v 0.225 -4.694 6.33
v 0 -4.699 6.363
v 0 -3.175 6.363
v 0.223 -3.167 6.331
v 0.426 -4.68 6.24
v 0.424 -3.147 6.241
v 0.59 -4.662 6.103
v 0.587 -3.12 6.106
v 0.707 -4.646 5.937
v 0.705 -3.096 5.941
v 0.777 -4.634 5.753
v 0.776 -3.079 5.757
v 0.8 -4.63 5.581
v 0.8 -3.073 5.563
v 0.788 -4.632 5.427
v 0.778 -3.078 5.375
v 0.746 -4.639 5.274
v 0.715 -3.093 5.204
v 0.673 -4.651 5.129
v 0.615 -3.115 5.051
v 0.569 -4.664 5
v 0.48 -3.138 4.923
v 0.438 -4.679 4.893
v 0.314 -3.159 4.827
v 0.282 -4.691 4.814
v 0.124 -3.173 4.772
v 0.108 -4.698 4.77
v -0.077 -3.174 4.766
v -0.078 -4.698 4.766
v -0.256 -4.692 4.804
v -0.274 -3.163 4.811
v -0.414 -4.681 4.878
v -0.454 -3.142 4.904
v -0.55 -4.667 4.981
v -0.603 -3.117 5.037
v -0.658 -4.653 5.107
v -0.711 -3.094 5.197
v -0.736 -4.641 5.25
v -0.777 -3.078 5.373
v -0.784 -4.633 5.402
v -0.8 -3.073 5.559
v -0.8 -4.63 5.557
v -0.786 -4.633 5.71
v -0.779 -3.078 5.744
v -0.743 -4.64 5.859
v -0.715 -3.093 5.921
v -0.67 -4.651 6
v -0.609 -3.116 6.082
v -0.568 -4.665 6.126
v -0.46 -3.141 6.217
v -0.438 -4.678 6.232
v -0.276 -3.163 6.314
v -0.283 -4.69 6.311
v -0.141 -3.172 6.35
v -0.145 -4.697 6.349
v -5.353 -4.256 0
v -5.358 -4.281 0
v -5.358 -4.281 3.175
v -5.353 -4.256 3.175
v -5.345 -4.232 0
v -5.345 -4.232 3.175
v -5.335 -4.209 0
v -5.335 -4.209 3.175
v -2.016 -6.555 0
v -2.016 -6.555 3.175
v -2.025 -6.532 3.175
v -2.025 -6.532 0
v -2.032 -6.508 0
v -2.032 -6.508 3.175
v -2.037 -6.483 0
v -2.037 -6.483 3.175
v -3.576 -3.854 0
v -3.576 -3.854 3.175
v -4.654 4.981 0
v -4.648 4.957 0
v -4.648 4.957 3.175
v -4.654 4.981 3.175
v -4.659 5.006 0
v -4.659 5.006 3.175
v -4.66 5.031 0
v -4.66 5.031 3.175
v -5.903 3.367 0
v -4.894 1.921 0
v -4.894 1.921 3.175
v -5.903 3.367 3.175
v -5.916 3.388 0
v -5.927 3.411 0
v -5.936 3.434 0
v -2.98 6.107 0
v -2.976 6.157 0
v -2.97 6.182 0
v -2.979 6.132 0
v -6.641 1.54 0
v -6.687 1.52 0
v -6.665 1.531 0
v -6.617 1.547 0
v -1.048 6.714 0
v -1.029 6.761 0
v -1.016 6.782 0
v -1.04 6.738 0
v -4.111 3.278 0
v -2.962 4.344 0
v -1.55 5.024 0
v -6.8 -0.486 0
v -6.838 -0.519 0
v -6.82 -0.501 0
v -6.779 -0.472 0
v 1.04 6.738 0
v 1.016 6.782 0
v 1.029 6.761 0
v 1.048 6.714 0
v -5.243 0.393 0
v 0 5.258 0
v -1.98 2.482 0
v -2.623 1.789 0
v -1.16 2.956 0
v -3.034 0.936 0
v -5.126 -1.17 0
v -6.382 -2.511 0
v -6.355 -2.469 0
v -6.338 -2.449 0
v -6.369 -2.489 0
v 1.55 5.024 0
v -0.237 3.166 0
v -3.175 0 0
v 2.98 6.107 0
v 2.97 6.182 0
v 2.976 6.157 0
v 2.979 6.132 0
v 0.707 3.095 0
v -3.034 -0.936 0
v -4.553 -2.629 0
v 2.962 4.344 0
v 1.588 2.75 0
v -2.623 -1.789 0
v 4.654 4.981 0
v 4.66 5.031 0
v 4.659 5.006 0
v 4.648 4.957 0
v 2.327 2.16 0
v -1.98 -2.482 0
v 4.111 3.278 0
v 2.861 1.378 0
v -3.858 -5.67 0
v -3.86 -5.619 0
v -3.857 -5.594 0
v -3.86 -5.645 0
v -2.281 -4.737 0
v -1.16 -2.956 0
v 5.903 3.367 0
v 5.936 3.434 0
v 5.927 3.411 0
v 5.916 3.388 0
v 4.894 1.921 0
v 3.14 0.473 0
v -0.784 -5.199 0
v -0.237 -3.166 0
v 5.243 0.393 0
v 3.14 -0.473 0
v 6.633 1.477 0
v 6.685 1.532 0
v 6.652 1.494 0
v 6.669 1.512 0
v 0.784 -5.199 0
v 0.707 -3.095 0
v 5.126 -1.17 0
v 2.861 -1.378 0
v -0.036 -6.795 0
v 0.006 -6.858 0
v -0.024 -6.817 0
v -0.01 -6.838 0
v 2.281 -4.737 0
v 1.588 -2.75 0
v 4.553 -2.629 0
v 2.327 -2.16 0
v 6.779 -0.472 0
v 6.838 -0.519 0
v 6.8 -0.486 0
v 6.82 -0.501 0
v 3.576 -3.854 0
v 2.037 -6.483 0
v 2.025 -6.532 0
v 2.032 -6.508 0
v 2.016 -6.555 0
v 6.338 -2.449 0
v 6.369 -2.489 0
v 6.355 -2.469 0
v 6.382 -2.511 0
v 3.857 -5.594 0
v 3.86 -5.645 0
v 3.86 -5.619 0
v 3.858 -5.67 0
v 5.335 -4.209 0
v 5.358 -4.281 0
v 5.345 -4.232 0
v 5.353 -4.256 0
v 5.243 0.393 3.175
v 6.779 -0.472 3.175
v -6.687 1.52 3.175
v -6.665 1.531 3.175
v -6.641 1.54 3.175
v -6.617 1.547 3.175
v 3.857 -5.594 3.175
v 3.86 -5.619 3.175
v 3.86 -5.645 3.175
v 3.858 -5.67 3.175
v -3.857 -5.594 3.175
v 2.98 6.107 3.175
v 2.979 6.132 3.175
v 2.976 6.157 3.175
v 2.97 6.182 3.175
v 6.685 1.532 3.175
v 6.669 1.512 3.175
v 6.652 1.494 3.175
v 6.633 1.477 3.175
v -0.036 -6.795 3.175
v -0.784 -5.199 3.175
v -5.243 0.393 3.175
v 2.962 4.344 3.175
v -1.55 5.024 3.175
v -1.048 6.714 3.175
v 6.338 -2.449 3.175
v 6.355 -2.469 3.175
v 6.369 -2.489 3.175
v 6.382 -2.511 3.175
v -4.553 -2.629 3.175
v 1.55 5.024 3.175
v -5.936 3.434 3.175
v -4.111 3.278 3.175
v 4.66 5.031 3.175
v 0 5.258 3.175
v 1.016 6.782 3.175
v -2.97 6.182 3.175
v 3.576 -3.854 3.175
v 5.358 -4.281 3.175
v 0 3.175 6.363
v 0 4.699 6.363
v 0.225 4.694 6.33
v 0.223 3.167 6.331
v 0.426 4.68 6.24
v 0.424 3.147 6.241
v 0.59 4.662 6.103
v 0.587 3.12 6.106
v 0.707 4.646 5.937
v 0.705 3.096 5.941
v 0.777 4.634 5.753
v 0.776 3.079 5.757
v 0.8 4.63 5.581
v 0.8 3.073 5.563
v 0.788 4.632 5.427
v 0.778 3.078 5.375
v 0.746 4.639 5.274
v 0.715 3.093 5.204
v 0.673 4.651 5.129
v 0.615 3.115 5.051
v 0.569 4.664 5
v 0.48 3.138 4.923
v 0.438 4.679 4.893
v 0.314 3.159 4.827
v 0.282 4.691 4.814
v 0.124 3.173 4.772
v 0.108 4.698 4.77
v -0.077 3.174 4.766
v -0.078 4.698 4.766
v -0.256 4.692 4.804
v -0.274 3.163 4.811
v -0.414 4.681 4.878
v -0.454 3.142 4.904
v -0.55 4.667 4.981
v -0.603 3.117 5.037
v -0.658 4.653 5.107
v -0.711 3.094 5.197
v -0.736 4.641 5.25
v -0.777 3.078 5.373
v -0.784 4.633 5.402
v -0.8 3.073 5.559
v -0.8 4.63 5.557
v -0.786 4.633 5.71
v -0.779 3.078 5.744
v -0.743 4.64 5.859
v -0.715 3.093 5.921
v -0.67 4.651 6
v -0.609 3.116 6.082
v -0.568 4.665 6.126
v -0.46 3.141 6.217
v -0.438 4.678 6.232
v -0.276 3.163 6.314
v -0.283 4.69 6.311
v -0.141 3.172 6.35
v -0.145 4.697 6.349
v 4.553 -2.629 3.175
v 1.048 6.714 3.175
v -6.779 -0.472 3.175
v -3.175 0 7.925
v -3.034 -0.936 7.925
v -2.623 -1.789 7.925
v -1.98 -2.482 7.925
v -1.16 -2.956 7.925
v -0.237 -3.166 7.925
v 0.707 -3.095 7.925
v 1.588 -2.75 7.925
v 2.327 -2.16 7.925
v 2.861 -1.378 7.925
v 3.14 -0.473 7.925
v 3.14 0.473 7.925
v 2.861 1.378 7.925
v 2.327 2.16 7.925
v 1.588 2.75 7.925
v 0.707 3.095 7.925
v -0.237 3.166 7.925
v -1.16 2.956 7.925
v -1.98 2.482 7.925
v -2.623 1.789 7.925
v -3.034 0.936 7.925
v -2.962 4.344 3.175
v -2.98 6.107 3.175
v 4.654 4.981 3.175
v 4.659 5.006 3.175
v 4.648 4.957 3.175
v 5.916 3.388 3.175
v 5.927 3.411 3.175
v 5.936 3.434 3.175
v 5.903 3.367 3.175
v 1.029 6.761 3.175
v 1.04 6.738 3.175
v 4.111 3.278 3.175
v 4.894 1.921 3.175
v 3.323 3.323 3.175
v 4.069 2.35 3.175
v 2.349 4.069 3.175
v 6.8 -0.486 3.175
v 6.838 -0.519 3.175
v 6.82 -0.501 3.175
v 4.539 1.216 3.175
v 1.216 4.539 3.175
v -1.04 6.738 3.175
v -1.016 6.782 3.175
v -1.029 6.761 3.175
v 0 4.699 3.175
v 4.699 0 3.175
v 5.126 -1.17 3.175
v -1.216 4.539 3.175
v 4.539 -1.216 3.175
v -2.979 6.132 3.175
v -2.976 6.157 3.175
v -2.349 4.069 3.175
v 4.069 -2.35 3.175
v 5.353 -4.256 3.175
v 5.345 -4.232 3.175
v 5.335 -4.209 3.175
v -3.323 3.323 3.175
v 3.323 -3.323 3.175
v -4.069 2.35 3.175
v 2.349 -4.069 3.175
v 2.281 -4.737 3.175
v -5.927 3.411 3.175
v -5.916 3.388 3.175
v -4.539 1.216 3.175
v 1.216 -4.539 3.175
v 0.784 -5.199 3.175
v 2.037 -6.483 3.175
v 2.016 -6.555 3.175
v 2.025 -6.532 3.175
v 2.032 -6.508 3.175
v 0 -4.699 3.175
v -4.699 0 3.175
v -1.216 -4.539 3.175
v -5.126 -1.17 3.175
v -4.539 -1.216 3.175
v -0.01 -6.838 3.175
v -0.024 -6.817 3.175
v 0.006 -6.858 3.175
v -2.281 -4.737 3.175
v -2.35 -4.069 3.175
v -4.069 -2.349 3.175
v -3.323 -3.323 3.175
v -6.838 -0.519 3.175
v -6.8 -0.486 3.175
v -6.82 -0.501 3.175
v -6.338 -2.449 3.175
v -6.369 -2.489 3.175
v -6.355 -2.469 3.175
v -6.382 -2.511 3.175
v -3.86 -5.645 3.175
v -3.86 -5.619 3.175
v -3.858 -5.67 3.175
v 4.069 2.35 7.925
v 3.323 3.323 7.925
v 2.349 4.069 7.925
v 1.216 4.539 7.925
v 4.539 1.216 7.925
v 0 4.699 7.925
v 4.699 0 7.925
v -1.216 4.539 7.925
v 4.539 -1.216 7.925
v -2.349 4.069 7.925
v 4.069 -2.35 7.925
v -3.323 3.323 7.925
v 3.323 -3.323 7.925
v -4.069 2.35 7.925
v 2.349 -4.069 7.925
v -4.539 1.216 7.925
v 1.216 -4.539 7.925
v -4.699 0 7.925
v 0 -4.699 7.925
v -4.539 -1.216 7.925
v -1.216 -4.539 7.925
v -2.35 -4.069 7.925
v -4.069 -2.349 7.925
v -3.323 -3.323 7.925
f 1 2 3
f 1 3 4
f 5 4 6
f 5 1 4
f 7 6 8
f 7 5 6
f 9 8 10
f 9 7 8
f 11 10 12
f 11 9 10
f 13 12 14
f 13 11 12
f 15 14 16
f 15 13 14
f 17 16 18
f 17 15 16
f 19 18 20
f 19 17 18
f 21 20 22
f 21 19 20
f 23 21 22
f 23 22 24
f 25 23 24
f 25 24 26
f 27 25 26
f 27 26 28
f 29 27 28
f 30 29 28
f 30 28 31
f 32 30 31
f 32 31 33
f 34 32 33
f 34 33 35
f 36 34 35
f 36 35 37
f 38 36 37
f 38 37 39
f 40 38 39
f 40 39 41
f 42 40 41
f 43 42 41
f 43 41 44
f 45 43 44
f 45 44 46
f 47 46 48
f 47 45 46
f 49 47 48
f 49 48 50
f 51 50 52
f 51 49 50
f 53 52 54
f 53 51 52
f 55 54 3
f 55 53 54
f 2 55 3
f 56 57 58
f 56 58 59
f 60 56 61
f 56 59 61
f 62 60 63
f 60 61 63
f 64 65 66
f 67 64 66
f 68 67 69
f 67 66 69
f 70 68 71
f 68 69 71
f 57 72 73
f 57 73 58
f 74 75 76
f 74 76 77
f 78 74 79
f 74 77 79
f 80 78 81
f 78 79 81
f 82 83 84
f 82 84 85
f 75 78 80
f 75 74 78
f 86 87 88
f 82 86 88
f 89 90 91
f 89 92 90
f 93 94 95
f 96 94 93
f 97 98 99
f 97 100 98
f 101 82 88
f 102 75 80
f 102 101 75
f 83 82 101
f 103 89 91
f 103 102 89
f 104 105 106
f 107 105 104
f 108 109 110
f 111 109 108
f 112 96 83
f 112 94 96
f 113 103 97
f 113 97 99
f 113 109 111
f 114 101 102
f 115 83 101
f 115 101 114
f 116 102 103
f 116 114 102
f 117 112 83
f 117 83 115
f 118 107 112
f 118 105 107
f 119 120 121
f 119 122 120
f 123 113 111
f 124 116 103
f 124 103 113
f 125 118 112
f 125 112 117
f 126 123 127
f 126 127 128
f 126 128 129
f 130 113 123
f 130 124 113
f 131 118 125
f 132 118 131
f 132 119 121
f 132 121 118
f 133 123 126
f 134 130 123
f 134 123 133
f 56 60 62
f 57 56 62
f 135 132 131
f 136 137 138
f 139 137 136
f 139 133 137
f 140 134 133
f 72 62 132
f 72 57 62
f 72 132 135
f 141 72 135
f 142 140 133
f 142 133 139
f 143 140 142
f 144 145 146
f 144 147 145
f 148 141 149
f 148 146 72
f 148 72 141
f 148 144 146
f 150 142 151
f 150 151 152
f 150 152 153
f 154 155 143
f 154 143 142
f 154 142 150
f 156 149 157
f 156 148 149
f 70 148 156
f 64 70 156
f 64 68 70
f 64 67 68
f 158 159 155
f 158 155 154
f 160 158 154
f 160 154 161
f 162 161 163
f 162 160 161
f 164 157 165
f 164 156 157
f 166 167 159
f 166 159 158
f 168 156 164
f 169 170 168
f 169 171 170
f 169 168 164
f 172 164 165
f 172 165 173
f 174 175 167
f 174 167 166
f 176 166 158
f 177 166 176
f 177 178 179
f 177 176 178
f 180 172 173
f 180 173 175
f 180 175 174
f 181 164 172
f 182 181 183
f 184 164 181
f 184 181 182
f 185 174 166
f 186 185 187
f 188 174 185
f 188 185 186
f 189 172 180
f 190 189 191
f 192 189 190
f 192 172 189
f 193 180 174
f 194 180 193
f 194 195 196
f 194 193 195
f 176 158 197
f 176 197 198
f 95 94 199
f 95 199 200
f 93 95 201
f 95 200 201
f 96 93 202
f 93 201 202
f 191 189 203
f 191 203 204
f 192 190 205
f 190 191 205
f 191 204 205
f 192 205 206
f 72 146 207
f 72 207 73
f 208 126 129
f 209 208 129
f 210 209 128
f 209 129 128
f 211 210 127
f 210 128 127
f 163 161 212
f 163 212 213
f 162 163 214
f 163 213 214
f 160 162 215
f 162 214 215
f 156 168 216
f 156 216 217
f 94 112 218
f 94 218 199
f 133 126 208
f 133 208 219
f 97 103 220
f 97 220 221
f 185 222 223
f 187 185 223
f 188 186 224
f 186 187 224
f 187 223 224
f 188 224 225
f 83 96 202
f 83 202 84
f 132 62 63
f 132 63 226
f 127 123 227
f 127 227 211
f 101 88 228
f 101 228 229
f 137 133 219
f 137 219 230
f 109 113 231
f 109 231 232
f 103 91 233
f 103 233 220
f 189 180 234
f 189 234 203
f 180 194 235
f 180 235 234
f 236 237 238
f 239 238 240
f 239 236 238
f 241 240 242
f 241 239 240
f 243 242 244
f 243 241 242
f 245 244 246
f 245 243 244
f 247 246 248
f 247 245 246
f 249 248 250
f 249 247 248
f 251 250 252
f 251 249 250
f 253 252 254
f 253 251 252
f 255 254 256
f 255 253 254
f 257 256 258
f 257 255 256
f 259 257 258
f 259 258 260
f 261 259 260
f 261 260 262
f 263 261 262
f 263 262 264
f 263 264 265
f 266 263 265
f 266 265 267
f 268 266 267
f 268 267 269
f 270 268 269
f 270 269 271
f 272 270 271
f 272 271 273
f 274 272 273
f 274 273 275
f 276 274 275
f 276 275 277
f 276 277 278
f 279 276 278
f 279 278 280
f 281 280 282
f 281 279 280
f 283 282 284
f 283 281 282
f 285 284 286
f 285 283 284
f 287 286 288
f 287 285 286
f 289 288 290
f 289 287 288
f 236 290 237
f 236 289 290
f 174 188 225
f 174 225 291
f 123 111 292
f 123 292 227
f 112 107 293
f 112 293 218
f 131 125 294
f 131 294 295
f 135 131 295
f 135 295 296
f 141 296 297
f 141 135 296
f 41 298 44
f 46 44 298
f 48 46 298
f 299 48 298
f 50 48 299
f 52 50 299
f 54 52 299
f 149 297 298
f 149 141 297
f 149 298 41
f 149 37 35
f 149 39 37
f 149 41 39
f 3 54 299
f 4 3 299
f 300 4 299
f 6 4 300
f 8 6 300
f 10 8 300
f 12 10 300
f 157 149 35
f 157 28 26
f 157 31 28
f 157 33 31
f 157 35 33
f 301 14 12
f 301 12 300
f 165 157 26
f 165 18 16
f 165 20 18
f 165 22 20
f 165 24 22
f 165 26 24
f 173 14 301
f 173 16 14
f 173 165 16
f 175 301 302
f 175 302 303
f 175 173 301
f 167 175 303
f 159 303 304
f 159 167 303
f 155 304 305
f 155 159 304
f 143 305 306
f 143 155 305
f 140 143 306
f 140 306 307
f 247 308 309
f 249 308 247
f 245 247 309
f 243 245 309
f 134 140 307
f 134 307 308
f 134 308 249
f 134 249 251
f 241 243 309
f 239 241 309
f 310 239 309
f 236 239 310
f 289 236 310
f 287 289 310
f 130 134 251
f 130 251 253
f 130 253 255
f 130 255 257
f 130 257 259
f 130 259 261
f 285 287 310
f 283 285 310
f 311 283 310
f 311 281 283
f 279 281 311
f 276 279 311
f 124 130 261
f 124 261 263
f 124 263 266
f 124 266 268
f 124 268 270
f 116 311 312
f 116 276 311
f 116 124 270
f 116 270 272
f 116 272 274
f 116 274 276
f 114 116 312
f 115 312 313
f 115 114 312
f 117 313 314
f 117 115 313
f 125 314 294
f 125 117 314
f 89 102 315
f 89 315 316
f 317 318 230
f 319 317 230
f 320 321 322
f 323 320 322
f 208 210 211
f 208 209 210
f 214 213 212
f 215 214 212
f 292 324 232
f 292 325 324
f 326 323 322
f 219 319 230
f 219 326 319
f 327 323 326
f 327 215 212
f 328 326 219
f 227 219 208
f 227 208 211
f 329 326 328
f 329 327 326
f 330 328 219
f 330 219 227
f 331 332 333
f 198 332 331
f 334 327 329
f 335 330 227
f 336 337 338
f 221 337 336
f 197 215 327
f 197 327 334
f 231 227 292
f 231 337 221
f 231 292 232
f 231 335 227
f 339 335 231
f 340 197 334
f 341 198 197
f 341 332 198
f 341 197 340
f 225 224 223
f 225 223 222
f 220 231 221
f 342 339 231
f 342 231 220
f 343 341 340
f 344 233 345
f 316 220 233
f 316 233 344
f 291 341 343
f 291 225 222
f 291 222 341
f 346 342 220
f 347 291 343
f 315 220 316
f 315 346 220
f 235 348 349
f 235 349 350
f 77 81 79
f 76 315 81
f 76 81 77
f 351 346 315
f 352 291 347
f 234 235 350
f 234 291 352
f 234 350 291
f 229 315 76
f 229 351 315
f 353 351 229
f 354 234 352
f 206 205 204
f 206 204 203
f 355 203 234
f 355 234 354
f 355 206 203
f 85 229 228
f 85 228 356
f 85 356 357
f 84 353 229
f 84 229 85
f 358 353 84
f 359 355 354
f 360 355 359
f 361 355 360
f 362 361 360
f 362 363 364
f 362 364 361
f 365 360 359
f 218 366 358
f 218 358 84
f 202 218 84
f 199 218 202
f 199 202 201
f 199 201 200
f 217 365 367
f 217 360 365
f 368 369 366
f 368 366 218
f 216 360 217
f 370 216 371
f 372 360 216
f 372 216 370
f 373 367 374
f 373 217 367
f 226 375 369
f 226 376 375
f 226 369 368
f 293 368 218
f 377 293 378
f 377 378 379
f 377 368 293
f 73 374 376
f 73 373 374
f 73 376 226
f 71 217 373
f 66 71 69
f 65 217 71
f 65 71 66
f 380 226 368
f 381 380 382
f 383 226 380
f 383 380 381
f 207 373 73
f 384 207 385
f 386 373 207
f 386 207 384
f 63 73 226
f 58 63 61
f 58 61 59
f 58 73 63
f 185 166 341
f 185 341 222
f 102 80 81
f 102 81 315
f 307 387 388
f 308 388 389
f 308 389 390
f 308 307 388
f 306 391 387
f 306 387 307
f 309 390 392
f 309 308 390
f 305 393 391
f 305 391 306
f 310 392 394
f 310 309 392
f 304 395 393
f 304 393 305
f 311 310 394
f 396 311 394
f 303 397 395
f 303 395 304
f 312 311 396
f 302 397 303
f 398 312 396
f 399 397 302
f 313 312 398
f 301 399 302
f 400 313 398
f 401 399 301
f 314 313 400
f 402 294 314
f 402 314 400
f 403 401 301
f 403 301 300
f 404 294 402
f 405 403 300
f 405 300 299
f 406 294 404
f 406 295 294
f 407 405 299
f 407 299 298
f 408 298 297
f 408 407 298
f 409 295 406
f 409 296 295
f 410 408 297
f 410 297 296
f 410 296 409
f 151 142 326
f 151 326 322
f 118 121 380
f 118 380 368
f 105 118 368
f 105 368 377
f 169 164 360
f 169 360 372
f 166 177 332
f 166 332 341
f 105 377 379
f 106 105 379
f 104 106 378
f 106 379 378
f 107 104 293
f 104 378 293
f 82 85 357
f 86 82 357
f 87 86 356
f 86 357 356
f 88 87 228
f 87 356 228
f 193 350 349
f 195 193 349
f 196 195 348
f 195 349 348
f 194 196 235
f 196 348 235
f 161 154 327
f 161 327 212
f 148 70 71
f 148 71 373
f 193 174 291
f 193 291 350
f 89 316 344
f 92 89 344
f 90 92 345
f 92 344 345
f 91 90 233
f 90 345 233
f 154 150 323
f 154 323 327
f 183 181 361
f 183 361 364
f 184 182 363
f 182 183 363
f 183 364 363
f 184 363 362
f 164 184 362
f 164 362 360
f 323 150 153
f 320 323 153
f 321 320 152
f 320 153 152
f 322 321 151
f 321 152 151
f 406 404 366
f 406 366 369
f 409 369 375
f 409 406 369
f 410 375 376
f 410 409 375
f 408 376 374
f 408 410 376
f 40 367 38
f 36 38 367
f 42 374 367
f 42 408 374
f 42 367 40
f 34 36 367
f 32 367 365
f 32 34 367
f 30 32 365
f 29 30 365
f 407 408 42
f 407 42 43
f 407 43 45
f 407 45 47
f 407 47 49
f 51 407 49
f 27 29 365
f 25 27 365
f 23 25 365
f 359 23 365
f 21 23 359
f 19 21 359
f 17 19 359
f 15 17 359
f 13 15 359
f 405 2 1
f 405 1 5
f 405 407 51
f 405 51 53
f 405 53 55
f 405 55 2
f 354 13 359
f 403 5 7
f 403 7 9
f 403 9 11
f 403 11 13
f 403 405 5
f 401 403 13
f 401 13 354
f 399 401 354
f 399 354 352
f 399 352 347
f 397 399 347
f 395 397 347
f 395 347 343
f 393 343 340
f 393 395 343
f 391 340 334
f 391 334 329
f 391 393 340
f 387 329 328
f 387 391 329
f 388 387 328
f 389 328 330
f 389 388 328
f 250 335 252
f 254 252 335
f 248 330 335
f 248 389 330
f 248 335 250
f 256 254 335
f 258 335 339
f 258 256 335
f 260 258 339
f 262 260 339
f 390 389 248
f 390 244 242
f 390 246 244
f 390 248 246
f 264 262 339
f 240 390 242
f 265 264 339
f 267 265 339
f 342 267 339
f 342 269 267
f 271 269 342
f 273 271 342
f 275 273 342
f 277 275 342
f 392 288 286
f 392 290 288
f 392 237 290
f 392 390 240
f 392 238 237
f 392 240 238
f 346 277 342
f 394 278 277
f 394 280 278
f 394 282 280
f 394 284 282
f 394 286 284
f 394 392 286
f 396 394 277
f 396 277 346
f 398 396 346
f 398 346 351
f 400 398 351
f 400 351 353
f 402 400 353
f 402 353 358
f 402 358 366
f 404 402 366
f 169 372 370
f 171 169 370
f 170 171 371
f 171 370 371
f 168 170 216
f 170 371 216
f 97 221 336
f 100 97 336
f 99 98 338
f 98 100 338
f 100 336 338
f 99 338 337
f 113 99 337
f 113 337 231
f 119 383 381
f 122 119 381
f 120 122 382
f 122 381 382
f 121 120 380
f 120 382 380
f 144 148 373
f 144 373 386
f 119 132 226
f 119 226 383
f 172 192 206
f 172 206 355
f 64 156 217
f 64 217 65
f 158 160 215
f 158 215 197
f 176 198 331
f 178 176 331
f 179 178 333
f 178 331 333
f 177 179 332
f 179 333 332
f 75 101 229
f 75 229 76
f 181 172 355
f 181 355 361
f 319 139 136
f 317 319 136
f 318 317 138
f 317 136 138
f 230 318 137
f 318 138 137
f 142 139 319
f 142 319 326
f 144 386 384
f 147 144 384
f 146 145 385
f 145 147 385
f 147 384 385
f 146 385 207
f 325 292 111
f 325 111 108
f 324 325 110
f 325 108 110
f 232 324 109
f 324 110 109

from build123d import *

# Parameters (mm, degrees)
CUT_EXTRUDE5_DEPTH      = 11.799302202
CUT_EXTRUDE5_DEPTH_BACK = 11.799302202
FILLET1_R               = 0.254
CUT_EXTRUDE4_DEPTH      = 13.513900808
CUT_EXTRUDE4_DEPTH_BACK = 13.513900808
SKETCH4_R               = 0.8001


with BuildPart() as part:
    # Sketch2 → Revolve1 (revolve)
    with BuildSketch(Plane(origin=(0, 0, 0), x_dir=(0, 0, -1), z_dir=(1, 0, 0)), mode=Mode.PRIVATE) as revolve1_sk:
        Polygon((0, 3.175), (0, 6.858), (-3.175, 6.858), (-3.175, 4.699), (-7.9248, 4.699), (-7.9248, 3.175), align=None)
    revolve(revolve1_sk.sketch.rotate(Axis((0, 0, -6.785443847), (0, 0, 1)), 90), axis=Axis((0, 0, -6.785443847), (0, 0, 1)))

    # Sketch5 → Cut-Extrude5 (cut, two sides: drawn at the far end of the back side and taken through both)
    with BuildSketch(Plane.XY.offset(3.175).offset(-CUT_EXTRUDE5_DEPTH_BACK)):
        with BuildLine():
            Line((-1.549763756, 5.024210698), (-1.028262887, 6.780474868))
            ThreePointArc((-1.028262887, 6.780474868), (-2.021430986, 6.553318302), (-2.969986829, 6.181532354))
            Line((-2.969986829, 6.181532354), (-1.549763756, 5.024210698))
        make_face()
        with BuildLine():
            Line((-2.961824201, 4.344198228), (-2.981160105, 6.176151587))
            ThreePointArc((-2.981160105, 6.176151587), (-3.863248958, 5.666345514), (-4.660077294, 5.031485229))
            Line((-4.660077294, 5.031485229), (-2.961824201, 4.344198228))
        make_face()
        with BuildLine():
            Line((-4.110713569, 3.27818468), (-4.669168164, 5.023050135))
            ThreePointArc((-4.669168164, 5.023050135), (-5.361800307, 4.275893061), (-5.936099441, 3.434368562))
            Line((-5.936099441, 3.434368562), (-4.110713569, 3.27818468))
        make_face()
        with BuildLine():
            Line((-4.894347996, 1.920890038), (-5.942300142, 3.423628634))
            ThreePointArc((-5.942300142, 3.423628634), (-6.383932168, 2.505508745), (-6.684673103, 1.532093177))
            Line((-6.684673103, 1.532093177), (-4.894347996, 1.920890038))
        make_face()
        with BuildLine():
            Line((-5.243098125, 0.392915886), (-6.687432674, 1.520002705))
            ThreePointArc((-6.687432674, 1.520002705), (-6.838823641, 0.512498982), (-6.839284225, -0.50631541))
            Line((-6.839284225, -0.50631541), (-5.243098125, 0.392915886))
        make_face()
        with BuildLine():
            Line((-5.125975977, -1.169970567), (-6.838357467, -0.518682134))
            ThreePointArc((-6.838357467, -0.518682134), (-6.686055622, -1.526048565), (-6.386194929, -2.499735652))
            Line((-6.386194929, -2.499735652), (-5.125975977, -1.169970567))
        make_face()
        with BuildLine():
            Line((-4.553388368, -2.6289), (-6.381664189, -2.51127979))
            ThreePointArc((-6.381664189, -2.51127979), (-5.939202219, -3.429), (-5.365664189, -4.271043411))
            Line((-5.365664189, -4.271043411), (-4.553388368, -2.6289))
        make_face()
        with BuildLine():
            Line((-3.576212221, -3.854240132), (-5.357932042, -4.280739216))
            ThreePointArc((-5.357932042, -4.280739216), (-4.664624636, -5.027269737), (-3.868370638, -5.662850219))
            Line((-3.868370638, -5.662850219), (-3.576212221, -3.854240132))
        make_face()
        with BuildLine():
            Line((-2.281273924, -4.737114114), (-3.85812412, -5.669836177))
            ThreePointArc((-3.85812412, -5.669836177), (-2.975574683, -6.178844496), (-2.02735538, -6.551487935))
            Line((-2.02735538, -6.551487935), (-2.281273924, -4.737114114))
        make_face()
        with BuildLine():
            Line((-0.783634427, -5.199074718), (-2.015504939, -6.555143312))
            ThreePointArc((-2.015504939, -6.555143312), (-1.022131861, -6.781401806), (-0.0062007, -6.857997197))
            Line((-0.0062007, -6.857997197), (-0.783634427, -5.199074718))
        make_face()
        with BuildLine():
            ThreePointArc((0.0062007, -6.857997197), (1.022131861, -6.781401806), (2.015504939, -6.555143312))
            Line((2.015504939, -6.555143312), (0.783634427, -5.199074718))
            Line((0.783634427, -5.199074718), (0.0062007, -6.857997197))
        make_face()
        with BuildLine():
            ThreePointArc((2.02735538, -6.551487935), (2.975574683, -6.178844496), (3.85812412, -5.669836177))
            Line((3.85812412, -5.669836177), (2.281273924, -4.737114114))
            Line((2.281273924, -4.737114114), (2.02735538, -6.551487935))
        make_face()
        with BuildLine():
            ThreePointArc((3.868370638, -5.662850219), (4.664624636, -5.027269737), (5.357932042, -4.280739216))
            Line((5.357932042, -4.280739216), (3.576212221, -3.854240132))
            Line((3.576212221, -3.854240132), (3.868370638, -5.662850219))
        make_face()
        with BuildLine():
            ThreePointArc((5.365664189, -4.271043411), (5.939202219, -3.429), (6.381664189, -2.51127979))
            Line((6.381664189, -2.51127979), (4.553388368, -2.6289))
            Line((4.553388368, -2.6289), (5.365664189, -4.271043411))
        make_face()
        with BuildLine():
            ThreePointArc((6.386194929, -2.499735652), (6.686055622, -1.526048565), (6.838357467, -0.518682134))
            Line((6.838357467, -0.518682134), (5.125975977, -1.169970567))
            Line((5.125975977, -1.169970567), (6.386194929, -2.499735652))
        make_face()
        with BuildLine():
            ThreePointArc((6.858, 0), (6.815224768, 0.764771443), (6.687432674, 1.520002705))
            Line((6.687432674, 1.520002705), (5.243098125, 0.392915886))
            Line((5.243098125, 0.392915886), (6.839284225, -0.50631541))
            ThreePointArc((6.839284225, -0.50631541), (6.853319459, -0.253330602), (6.858, 0))
        make_face()
        with BuildLine():
            ThreePointArc((6.684673103, 1.532093177), (6.383932168, 2.505508745), (5.942300142, 3.423628634))
            Line((5.942300142, 3.423628634), (4.894347996, 1.920890038))
            Line((4.894347996, 1.920890038), (6.684673103, 1.532093177))
        make_face()
        with BuildLine():
            ThreePointArc((5.936099441, 3.434368562), (5.361800307, 4.275893061), (4.669168164, 5.023050135))
            Line((4.669168164, 5.023050135), (4.110713569, 3.27818468))
            Line((4.110713569, 3.27818468), (5.936099441, 3.434368562))
        make_face()
        with BuildLine():
            ThreePointArc((4.660077294, 5.031485229), (3.863248958, 5.666345514), (2.981160105, 6.176151587))
            Line((2.981160105, 6.176151587), (2.961824201, 4.344198228))
            Line((2.961824201, 4.344198228), (4.660077294, 5.031485229))
        make_face()
        with BuildLine():
            ThreePointArc((2.969986829, 6.181532354), (2.021430986, 6.553318302), (1.028262887, 6.780474868))
            Line((1.028262887, 6.780474868), (1.549763756, 5.024210698))
            Line((1.549763756, 5.024210698), (2.969986829, 6.181532354))
        make_face()
        with BuildLine():
            Line((0, 6.858), (0, 5.2578))
            Line((0, 5.2578), (1.016, 6.782323201))
            ThreePointArc((1.016, 6.782323201), (0.509407248, 6.839054632), (0, 6.858))
        make_face()
        with BuildLine():
            Line((-1.016, 6.782323201), (0, 5.2578))
            Line((0, 5.2578), (0, 6.858))
            ThreePointArc((0, 6.858), (-0.509407248, 6.839054632), (-1.016, 6.782323201))
        make_face()
    extrude(amount=CUT_EXTRUDE5_DEPTH + CUT_EXTRUDE5_DEPTH_BACK, mode=Mode.SUBTRACT)

    # Fillet1
    # the kernel refuses this fillet: 0.254 mm, written as the material it takes off along each edge
    with BuildSketch(Plane(origin=(1.028262887, 6.780474868, -0.173566316), x_dir=(0.2846534382375399, -0.958630491951694, 0), z_dir=(0, 0, 1)), Plane(origin=(2.981160105, 6.176151587, -0.173566316), x_dir=(-0.010554213197513457, -0.9999443027407983, 0), z_dir=(0, 0, 1)), Plane(origin=(4.669168164, 5.023050135, -0.173566316), x_dir=(-0.3048240764735684, -0.9524086740480875, 0), z_dir=(0, 0, 1)), Plane(origin=(5.942300142, 3.423628634, -0.173566316), x_dir=(-0.5720089828565192, -0.8202473550895794, 0), z_dir=(0, 0, 1))) as fillet1_piece_1:
        with BuildLine():
            CenterArc((0.069426526, -0.254), FILLET1_R, 90, 17.100666737)
            Line((-0.005262541, -0.011229443), (-0.006756323, -0.006374032))
            ThreePointArc((-0.006756323, -0.006374032), (-0.007233739, -0.003457831), (-0.004597979, 0.002159859))
            Line((-0.004597979, 0.002159859), (0, 0.00508))
            Line((0, 0.00508), (0.069426526, 0.00508))
            Line((0.069426526, 0.00508), (0.069426526, 0))
        make_face()
    extrude(amount=3.522132632, mode=Mode.SUBTRACT)
    with BuildSketch(Plane(origin=(6.687432674, 1.520002705, 3.348566316), x_dir=(-0.7883683808925953, -0.6152034590351292, 0), z_dir=(0, 0, -1)), Plane(origin=(-0.0062007, -6.857997197, 3.348566316), x_dir=(-0.4243505554663044, 0.9054979878914358, 0), z_dir=(0, 0, -1)), Plane(origin=(-2.02735538, -6.551487935, 3.348566316), x_dir=(-0.13859763357417676, 0.9903487749109595, 0), z_dir=(0, 0, -1)), Plane(origin=(-3.868370638, -5.662850219, 3.348566316), x_dir=(0.15947029628670847, 0.9872027272056279, 0), z_dir=(0, 0, -1)), Plane(origin=(-5.365664189, -4.271043411, 3.348566316), x_dir=(0.4433685904986441, 0.8963393849202688, 0), z_dir=(0, 0, -1)), Plane(origin=(-6.386194929, -2.499735652, 3.348566316), x_dir=(0.687871639753785, 0.7258323547641282, 0), z_dir=(0, 0, -1)), Plane(origin=(-6.684673103, 1.532093177, 3.348566316), x_dir=(0.9772221447470836, 0.21221894311279188, 0), z_dir=(0, 0, -1))) as fillet1_piece_2:
        with BuildLine():
            CenterArc((0.069426526, 0.254), FILLET1_R, 252.899333263, 17.100666737)
            Line((-0.005262541, 0.011229443), (-0.006756323, 0.006374032))
            ThreePointArc((-0.006756323, 0.006374032), (-0.007233739, 0.003457831), (-0.004597979, -0.002159859))
            Line((-0.004597979, -0.002159859), (0, -0.00508))
            Line((0, -0.00508), (0.069426526, -0.00508))
            Line((0.069426526, -0.00508), (0.069426526, 0))
        make_face()
    extrude(amount=3.522132632, mode=Mode.SUBTRACT)
    with BuildSketch(Plane(origin=(6.839284225, -0.50631541, 3.348566316), x_dir=(-0.07473009358640008, -0.9972037971811819, 0), z_dir=(0, 0, -1)), Plane(origin=(6.386194929, -2.499735652, 3.348566316), x_dir=(-0.3653410243663928, -0.9308737486442051, 0), z_dir=(0, 0, -1)), Plane(origin=(5.365664189, -4.271043411, 3.348566316), x_dir=(-0.623489801858665, -0.7818314824680845, 0), z_dir=(0, 0, -1)), Plane(origin=(3.868370638, -5.662850219, 3.348566316), x_dir=(-0.8262387743159489, -0.5633200580636893, 0), z_dir=(0, 0, -1)), Plane(origin=(2.02735538, -6.551487935, 3.348566316), x_dir=(-0.9555728057861146, -0.2947551744109893, 0), z_dir=(0, 0, -1)), Plane(origin=(-1.028262887, 6.780474868, 3.348566316), x_dir=(0.9888308262251171, 0.14904226617625063, 0), z_dir=(0, 0, -1)), Plane(origin=(-2.981160105, 6.176151587, 3.348566316), x_dir=(0.9009688679024408, 0.4338837391175129, 0), z_dir=(0, 0, -1)), Plane(origin=(-4.669168164, 5.023050135, 3.348566316), x_dir=(0.7330518718297447, 0.6801727377710072, 0), z_dir=(0, 0, -1)), Plane(origin=(-5.942300142, 3.423628634, 3.348566316), x_dir=(0.50000000000004, 0.8660254037844156, 0), z_dir=(0, 0, -1))) as fillet1_piece_3:
        with BuildLine():
            CenterArc((0.200535304, 0.170650621), FILLET1_R, 205.109562615, 17.100666737)
            Line((-0.029461185, 0.06286558), (-0.034061115, 0.060709879))
            Line((-0.034061115, 0.060709879), (-0.00459993, -0.002155701))
            Line((-0.00459993, -0.002155701), (-4.593e-06, -0.005079998))
            ThreePointArc((-4.593e-06, -0.005079998), (0.0062007, -0.005082803), (0.008638723, -0.003413012))
            Line((0.008638723, -0.003413012), (0.012401401, 0))
        make_face()
    extrude(amount=3.522132632, mode=Mode.SUBTRACT)
    with BuildSketch(Plane(origin=(-6.839284225, -0.50631541, 3.348566316), x_dir=(0.07473009358634887, -0.9972037971811858, 0), z_dir=(0, 0, -1))) as fillet1_piece_4:
        with BuildLine():
            CenterArc((0.200535304, -0.170650621), FILLET1_R, 137.789770648, 17.100666737)
            Line((-0.029461185, -0.06286558), (-0.034061115, -0.060709879))
            Line((-0.034061115, -0.060709879), (-0.00459993, 0.002155701))
            Line((-0.00459993, 0.002155701), (-4.593e-06, 0.005079998))
            ThreePointArc((-4.593e-06, 0.005079998), (0.0062007, 0.005082803), (0.008638723, 0.003413012))
            Line((0.008638723, 0.003413012), (0.012401401, 0))
        make_face()
    extrude(amount=3.522132632, mode=Mode.SUBTRACT)

    # Sketch4 → Cut-Extrude4 (cut, two sides: drawn at the far end of the back side and taken through both)
    with BuildSketch(Plane(origin=(0, 0, 0), x_dir=(1, 0, 0), z_dir=(0, 1, 0)).offset(-CUT_EXTRUDE4_DEPTH_BACK)):
        with Locations(Location((0, -5.5626, 0), (0, 0, 270))):
            Circle(SKETCH4_R)
    extrude(amount=CUT_EXTRUDE4_DEPTH + CUT_EXTRUDE4_DEPTH_BACK, mode=Mode.SUBTRACT)


solid = part.part
